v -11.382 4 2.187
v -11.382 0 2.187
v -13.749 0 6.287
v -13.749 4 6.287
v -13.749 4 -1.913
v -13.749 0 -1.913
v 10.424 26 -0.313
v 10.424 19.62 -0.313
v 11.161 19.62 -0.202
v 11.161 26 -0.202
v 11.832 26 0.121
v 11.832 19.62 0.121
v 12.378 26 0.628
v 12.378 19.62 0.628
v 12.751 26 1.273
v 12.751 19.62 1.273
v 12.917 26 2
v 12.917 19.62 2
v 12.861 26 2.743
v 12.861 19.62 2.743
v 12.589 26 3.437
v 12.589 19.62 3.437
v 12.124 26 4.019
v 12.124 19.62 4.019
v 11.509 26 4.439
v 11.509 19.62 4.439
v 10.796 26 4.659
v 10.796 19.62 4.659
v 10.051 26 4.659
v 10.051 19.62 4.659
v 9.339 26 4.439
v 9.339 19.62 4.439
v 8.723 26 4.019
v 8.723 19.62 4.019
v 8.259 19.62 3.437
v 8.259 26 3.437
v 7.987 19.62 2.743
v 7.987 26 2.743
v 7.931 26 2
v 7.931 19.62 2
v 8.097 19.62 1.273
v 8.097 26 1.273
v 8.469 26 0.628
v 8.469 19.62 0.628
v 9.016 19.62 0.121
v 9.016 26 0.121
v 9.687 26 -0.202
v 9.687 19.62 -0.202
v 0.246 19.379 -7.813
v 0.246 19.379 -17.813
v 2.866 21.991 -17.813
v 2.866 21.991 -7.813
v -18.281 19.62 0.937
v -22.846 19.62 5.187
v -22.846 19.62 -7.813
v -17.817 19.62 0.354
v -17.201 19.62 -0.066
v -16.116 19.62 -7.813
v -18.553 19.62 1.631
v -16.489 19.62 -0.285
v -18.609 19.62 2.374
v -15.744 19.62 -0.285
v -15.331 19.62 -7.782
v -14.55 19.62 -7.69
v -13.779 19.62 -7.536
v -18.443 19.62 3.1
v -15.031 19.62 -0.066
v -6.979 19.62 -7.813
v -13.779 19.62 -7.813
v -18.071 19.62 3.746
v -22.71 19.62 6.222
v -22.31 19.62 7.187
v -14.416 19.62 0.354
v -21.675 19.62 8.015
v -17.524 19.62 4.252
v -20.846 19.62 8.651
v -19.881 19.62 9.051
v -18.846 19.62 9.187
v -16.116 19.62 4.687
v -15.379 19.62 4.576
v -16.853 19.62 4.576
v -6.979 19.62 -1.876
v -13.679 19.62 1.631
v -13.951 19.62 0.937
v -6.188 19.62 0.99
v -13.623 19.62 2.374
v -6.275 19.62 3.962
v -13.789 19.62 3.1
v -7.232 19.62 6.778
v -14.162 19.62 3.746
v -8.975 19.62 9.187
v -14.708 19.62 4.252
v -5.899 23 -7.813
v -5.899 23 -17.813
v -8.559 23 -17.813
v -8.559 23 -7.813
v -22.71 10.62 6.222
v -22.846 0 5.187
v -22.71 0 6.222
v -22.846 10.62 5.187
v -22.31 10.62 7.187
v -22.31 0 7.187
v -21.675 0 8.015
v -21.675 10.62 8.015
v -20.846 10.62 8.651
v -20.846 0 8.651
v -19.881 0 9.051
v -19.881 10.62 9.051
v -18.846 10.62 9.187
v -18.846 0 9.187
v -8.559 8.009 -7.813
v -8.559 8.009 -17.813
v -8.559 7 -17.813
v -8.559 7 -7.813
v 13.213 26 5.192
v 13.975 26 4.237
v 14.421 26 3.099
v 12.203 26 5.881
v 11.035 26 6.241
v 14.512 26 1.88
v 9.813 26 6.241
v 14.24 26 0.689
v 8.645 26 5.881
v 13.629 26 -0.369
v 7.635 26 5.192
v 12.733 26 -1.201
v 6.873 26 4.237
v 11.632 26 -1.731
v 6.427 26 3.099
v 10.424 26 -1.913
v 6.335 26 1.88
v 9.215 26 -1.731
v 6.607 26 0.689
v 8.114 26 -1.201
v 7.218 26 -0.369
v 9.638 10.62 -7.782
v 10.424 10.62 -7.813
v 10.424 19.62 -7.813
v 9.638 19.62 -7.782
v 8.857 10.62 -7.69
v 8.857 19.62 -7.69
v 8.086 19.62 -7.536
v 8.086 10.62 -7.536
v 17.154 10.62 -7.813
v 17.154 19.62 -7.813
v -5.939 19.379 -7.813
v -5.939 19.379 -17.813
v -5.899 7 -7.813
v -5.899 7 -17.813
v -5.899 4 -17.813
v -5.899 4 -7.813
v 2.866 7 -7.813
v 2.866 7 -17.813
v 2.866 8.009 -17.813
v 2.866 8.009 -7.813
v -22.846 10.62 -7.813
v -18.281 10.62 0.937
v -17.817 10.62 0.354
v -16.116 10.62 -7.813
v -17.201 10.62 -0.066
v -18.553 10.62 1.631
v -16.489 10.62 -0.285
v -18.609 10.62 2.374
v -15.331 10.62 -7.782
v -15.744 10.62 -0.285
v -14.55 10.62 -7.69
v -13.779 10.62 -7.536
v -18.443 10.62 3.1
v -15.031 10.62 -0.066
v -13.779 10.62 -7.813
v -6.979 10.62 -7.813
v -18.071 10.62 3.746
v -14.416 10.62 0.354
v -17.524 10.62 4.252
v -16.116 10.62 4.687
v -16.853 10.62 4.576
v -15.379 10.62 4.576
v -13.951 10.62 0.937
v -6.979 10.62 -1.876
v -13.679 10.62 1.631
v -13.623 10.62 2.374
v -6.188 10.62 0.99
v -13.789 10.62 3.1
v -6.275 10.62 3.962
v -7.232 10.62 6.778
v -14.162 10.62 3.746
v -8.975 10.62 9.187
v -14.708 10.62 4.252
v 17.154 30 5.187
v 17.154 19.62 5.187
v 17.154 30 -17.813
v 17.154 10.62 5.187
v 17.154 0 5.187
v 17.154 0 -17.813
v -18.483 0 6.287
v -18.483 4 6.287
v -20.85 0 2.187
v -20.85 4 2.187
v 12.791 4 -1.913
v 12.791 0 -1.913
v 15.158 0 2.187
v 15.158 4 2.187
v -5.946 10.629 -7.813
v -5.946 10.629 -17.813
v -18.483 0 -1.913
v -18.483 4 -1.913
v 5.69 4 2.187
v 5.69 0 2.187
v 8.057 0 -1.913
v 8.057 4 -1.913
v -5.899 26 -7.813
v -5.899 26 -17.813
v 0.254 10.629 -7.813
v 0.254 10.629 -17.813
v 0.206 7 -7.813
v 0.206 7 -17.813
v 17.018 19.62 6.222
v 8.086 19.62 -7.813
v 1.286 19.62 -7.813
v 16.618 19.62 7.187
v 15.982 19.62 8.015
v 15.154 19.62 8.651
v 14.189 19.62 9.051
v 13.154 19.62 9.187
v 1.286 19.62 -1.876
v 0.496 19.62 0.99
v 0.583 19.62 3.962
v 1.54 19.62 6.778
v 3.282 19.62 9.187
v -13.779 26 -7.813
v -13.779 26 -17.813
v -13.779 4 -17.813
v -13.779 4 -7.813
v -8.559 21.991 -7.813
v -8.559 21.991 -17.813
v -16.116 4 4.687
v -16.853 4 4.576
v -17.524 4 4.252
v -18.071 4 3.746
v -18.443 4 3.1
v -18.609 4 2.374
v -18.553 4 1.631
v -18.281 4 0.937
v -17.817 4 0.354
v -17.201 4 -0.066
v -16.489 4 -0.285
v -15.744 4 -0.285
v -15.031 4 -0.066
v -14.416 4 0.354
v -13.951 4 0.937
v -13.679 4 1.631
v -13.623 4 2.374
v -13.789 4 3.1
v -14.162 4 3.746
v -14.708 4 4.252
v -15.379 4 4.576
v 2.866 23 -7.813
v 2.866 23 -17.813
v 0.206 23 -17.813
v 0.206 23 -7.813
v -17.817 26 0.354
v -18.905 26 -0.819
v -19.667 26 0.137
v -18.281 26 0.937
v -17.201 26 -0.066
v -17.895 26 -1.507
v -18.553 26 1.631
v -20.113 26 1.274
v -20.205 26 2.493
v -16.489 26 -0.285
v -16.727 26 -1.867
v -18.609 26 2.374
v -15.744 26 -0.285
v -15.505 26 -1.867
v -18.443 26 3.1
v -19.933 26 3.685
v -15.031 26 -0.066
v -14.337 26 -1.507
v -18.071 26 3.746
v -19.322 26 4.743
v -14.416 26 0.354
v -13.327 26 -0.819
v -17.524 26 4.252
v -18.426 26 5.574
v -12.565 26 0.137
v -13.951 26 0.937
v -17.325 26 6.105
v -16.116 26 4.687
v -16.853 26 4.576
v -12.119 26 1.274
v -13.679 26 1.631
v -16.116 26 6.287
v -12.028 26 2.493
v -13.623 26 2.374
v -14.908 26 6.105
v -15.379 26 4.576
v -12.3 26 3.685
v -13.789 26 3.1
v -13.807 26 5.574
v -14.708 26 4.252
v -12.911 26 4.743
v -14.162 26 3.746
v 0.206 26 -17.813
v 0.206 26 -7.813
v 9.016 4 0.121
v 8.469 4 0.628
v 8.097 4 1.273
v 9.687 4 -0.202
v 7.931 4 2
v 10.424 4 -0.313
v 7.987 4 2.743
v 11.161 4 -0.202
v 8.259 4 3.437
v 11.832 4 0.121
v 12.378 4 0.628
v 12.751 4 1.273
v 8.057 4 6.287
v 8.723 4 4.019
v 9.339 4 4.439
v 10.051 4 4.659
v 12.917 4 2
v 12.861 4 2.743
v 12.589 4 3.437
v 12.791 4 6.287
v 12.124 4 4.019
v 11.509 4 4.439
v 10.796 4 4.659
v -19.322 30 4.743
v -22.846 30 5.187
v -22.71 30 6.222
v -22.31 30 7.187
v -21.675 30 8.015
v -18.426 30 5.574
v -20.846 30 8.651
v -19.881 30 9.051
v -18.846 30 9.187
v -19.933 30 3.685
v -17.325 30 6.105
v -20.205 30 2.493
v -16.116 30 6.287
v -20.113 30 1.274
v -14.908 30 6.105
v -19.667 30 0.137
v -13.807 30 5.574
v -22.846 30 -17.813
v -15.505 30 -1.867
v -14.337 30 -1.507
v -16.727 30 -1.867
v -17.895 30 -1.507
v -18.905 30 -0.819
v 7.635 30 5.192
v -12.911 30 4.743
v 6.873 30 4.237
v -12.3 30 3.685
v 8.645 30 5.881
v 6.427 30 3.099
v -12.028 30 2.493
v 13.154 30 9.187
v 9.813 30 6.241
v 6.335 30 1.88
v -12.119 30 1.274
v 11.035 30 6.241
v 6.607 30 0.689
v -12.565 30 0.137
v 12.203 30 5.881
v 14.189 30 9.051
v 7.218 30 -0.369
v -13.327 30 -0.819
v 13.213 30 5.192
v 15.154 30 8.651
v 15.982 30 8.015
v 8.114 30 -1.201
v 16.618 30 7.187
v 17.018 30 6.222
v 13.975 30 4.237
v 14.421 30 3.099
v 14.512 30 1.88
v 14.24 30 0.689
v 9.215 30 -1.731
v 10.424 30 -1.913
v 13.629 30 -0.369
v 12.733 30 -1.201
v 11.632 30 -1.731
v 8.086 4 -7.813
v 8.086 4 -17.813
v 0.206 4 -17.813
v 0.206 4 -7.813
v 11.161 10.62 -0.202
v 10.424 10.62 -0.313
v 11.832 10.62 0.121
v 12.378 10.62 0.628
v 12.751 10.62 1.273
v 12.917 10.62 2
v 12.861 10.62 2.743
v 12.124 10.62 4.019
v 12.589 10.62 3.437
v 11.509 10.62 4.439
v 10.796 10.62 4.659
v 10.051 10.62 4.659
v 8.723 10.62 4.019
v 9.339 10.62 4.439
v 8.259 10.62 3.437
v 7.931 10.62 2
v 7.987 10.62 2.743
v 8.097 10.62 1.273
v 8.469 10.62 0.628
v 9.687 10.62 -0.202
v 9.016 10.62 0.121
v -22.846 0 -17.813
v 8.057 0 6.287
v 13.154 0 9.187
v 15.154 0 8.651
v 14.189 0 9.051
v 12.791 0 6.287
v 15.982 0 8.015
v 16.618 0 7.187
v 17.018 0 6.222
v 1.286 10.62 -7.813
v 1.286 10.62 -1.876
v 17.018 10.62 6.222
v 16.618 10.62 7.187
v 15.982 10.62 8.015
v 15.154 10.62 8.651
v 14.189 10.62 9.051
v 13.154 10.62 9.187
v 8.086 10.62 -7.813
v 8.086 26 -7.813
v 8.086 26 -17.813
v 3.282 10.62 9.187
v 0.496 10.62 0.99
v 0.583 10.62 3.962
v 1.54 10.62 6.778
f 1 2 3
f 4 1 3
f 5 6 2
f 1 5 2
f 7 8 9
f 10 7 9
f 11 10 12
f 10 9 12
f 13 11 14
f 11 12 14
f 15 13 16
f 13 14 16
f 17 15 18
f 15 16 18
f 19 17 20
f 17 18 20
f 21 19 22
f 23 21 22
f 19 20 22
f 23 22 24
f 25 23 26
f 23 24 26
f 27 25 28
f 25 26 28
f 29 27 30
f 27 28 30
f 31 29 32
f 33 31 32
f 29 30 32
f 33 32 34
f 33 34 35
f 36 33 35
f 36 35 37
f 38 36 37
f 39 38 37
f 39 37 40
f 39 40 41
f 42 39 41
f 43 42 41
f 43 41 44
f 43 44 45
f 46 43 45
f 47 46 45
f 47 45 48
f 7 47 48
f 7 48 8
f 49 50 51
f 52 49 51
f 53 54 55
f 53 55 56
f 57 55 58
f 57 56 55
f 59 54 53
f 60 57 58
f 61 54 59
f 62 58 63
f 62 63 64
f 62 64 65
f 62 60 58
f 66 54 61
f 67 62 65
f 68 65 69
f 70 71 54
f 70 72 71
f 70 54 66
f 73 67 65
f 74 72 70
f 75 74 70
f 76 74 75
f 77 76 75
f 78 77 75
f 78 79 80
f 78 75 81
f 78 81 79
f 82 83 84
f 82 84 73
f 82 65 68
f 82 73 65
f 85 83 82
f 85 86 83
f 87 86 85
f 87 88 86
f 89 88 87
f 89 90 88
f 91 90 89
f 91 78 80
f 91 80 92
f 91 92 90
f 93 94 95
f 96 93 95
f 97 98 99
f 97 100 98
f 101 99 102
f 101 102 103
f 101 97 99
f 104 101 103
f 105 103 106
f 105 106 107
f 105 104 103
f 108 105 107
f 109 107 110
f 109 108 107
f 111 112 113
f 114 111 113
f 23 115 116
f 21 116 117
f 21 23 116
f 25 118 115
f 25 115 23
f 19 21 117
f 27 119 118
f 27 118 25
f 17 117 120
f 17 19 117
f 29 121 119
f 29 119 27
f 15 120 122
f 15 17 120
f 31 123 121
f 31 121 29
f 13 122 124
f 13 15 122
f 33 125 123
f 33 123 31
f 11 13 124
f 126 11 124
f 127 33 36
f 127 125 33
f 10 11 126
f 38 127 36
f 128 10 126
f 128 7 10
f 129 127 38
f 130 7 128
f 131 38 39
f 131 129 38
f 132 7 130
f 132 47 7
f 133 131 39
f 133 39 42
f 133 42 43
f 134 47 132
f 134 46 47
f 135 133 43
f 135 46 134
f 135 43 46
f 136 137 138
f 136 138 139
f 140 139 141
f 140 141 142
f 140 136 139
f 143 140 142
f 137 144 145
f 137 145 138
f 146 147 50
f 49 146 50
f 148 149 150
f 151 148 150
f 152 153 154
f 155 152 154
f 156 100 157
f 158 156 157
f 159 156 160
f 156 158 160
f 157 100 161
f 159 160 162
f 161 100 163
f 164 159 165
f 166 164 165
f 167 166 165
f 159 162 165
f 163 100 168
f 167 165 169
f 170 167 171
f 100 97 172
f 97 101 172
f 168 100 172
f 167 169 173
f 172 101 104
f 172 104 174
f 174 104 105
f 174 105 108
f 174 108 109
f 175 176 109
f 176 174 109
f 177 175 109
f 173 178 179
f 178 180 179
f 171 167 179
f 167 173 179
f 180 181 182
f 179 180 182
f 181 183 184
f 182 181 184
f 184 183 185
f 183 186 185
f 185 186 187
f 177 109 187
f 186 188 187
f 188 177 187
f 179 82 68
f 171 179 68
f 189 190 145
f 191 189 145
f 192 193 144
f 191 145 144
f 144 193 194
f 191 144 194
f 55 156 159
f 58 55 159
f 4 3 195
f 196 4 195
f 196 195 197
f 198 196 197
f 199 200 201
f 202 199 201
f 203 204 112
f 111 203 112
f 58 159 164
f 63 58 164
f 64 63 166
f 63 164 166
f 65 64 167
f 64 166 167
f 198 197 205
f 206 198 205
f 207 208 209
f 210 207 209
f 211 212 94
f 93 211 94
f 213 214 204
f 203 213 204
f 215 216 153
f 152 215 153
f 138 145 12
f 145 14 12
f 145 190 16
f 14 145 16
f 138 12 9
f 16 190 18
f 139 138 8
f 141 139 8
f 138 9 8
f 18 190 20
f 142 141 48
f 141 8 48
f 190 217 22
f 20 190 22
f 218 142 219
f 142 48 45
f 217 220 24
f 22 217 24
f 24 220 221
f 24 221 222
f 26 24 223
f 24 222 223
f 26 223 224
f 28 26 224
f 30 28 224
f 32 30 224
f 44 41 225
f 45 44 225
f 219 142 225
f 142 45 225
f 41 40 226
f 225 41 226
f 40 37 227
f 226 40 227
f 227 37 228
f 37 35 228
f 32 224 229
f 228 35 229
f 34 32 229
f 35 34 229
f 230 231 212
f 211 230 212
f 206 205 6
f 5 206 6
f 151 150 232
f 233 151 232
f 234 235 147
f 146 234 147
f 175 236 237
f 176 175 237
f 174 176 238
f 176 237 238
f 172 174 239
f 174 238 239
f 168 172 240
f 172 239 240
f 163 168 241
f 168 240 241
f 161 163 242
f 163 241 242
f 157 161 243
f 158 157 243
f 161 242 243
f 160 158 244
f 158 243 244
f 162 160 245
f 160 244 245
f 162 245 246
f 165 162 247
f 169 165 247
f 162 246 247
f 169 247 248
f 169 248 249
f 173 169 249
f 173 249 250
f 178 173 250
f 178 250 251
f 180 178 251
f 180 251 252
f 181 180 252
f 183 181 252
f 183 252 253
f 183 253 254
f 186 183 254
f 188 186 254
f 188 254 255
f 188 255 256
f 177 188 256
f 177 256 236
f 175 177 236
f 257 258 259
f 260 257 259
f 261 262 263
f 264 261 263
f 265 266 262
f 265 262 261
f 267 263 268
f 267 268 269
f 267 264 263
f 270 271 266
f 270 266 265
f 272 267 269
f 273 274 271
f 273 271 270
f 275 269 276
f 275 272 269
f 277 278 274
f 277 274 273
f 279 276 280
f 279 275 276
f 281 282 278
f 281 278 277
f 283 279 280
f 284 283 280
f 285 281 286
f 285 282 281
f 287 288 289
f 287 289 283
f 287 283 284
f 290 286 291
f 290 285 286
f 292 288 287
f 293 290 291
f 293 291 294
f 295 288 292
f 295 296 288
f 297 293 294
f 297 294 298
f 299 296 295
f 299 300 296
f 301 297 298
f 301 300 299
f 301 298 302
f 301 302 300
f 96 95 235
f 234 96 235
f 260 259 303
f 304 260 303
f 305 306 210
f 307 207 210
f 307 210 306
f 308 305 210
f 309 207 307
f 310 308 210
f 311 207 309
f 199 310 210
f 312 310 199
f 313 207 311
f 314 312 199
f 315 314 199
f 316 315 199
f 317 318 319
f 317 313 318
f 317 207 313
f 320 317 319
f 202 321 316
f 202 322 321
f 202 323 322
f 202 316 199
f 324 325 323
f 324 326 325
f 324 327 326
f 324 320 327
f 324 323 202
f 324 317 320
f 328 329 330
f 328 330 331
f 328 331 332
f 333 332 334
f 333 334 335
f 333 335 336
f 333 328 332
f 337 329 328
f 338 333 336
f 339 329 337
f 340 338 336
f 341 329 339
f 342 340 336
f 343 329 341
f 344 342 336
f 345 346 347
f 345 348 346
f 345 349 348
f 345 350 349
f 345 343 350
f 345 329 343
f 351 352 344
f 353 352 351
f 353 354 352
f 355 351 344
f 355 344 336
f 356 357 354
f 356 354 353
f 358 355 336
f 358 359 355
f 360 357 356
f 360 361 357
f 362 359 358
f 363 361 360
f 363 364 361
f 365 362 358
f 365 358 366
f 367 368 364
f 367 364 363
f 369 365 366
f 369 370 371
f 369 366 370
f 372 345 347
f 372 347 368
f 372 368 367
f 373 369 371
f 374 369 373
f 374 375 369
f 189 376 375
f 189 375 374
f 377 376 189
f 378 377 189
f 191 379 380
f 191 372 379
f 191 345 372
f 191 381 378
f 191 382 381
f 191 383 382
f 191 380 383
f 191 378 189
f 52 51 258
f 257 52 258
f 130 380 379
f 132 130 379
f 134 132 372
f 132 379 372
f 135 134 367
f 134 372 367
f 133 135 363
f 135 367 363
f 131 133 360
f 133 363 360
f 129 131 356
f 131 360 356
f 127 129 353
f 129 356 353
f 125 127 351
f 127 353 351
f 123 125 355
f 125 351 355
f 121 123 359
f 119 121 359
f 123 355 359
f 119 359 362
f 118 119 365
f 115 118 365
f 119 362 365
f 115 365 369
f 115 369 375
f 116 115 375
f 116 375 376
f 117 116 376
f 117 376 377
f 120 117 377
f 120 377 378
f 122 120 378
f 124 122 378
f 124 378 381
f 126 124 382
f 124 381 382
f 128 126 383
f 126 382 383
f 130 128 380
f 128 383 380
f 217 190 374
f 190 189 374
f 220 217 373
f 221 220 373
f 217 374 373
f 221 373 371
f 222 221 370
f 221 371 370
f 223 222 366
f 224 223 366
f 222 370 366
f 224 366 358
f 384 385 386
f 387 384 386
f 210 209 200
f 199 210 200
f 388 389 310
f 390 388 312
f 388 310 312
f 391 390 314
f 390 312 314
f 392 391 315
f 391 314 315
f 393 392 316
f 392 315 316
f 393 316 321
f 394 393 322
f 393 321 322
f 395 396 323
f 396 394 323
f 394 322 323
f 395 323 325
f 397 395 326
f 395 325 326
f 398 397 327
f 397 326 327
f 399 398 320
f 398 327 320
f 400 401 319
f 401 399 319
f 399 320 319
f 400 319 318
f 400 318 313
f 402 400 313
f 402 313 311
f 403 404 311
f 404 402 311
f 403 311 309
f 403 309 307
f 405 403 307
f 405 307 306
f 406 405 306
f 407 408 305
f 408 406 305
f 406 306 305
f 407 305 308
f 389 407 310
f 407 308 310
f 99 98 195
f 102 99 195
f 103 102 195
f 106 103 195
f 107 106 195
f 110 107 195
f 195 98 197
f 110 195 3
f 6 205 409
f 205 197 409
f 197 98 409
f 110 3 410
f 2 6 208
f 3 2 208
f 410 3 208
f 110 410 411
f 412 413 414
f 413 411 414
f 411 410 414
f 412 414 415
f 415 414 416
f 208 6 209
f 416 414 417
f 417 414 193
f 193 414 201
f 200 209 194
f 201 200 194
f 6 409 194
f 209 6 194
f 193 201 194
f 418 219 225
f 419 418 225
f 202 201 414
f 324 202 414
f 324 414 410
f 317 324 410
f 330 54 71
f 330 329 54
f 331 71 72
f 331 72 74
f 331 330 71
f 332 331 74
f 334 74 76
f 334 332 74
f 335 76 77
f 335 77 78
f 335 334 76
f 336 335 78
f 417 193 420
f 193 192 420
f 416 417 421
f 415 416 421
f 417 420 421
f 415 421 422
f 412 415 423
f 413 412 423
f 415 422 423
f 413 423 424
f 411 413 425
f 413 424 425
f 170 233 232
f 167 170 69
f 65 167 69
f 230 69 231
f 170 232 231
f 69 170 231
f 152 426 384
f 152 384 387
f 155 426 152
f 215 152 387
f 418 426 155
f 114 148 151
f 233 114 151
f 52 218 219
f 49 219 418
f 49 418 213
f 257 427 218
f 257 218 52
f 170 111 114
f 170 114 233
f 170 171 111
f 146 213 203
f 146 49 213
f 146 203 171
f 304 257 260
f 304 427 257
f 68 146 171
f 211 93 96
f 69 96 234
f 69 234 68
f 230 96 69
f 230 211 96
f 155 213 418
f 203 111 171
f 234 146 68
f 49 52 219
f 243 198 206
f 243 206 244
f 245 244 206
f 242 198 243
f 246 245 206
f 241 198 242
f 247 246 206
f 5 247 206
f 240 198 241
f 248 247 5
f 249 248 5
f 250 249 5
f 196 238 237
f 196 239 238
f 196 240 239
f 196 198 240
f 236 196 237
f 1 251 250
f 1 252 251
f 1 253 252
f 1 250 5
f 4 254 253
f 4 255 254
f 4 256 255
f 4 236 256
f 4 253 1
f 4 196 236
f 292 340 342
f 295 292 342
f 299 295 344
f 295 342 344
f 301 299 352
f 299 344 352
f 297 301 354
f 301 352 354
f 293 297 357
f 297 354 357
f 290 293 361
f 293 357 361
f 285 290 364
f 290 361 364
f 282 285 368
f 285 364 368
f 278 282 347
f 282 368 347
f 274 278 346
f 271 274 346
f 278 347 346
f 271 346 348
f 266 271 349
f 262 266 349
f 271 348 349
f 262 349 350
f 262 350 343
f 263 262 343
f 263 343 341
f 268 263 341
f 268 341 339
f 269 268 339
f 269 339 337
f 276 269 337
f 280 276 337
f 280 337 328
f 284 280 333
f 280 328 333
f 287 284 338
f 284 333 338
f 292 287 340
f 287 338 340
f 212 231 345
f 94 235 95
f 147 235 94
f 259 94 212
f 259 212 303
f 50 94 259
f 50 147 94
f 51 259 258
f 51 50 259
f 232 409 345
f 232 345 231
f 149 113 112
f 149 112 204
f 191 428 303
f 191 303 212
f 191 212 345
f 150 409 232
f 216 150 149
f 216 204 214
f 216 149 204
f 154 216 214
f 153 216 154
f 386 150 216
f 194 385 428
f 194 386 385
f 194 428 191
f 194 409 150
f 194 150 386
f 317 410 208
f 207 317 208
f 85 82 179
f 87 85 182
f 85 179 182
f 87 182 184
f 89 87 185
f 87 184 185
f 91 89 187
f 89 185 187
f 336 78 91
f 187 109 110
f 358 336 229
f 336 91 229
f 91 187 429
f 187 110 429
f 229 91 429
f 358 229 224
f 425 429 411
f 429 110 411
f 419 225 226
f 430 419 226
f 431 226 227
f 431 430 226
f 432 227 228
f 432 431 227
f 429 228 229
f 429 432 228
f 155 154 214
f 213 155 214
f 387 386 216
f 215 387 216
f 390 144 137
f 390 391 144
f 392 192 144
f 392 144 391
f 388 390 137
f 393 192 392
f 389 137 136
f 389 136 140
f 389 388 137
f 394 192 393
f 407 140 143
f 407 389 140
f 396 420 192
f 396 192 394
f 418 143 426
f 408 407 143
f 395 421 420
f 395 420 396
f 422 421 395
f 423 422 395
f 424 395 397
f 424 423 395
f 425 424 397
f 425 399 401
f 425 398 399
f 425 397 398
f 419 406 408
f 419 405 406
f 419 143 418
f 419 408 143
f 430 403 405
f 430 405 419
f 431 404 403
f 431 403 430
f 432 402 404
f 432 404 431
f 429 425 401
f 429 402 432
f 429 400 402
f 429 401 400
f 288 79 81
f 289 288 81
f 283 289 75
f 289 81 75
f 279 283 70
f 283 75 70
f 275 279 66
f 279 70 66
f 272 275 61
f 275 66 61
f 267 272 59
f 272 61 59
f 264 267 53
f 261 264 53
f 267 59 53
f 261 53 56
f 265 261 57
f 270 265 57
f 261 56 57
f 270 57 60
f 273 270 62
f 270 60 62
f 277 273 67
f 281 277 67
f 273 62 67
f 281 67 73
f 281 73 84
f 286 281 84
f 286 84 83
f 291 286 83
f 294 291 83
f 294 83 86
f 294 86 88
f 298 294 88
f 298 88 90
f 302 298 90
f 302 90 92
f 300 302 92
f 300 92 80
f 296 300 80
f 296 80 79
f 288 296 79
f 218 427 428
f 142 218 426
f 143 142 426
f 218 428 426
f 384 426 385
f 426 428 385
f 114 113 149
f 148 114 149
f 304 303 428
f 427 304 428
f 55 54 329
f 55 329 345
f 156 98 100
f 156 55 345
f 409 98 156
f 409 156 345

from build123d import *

# Parameters (mm, degrees)
SKETCH1_W           = 40
SKETCH1_H           = 27
BOSS_EXTRUDE1_DEPTH = 30
CUT_EXTRUDE1_DEPTH  = 10
SKETCH3_R           = 2.5
CUT_EXTRUDE2_DEPTH  = 30
CUT_EXTRUDE5_START  = -10.62
CUT_EXTRUDE5_DEPTH  = 9
SKETCH10_W          = 20
SKETCH10_H          = 9
CUT_EXTRUDE7_DEPTH  = 6.8
SKETCH12_W          = 20
SKETCH12_H          = 9
CUT_EXTRUDE10_DEPTH = 6.8
FILLET1_R           = 4
SKETCH15_R          = 4.1
CUT_EXTRUDE12_DEPTH = 4
SKETCH16_R          = 2.5
CUT_EXTRUDE13_DEPTH = 4


with BuildPart() as part:
    # Sketch1 → Boss-Extrude1 (new body)
    with BuildSketch(Plane(origin=(0, 0, 0), x_dir=(1, 0, 0), z_dir=(0, 1, 0))):
        with Locations((-2.846153846, 4.313186813)):
            Rectangle(SKETCH1_W, SKETCH1_H)
    extrude(amount=BOSS_EXTRUDE1_DEPTH)

    # Sketch2 → Cut-Extrude1 (cut)
    with BuildSketch(Plane(origin=(0, 0, -17.813186813), x_dir=(-1, 0, 0), z_dir=(0, 0, -1))):
        Polygon((-8.086431081, 26), (-8.086431081, 4), (-0.206431081, 4), (-0.206431081, 7), (-2.866431081, 7), (-2.866431081, 8.008707537), (-0.253846154, 10.628707537), (5.946153846, 10.628707537), (8.558738773, 8.008707537), (8.558738773, 7), (5.898738773, 7), (5.898738773, 4), (13.778738773, 4), (13.778738773, 26), (5.898738773, 26), (5.898738773, 23), (8.558738773, 23), (8.558738773, 21.991292463), (5.938738773, 19.378707537), (-0.246431081, 19.378707537), (-2.866431081, 21.991292463), (-2.866431081, 23), (-0.206431081, 23), (-0.206431081, 26), align=None)
    extrude(amount=-CUT_EXTRUDE1_DEPTH, mode=Mode.SUBTRACT)

    # Sketch3 → Cut-Extrude2 (cut)
    with BuildSketch(Plane.XZ):
        with Locations((10.423846154, 2.186813187)):
            Circle(SKETCH3_R)
        with Locations((-16.116153846, 2.186813187)):
            Circle(SKETCH3_R)
    extrude(amount=-CUT_EXTRUDE2_DEPTH, mode=Mode.SUBTRACT)

    # Sketch8 → Cut-Extrude5 (cut)
    with BuildSketch(Plane.XZ.offset(CUT_EXTRUDE5_START)):
        with BuildLine():
            Line((17.153846154, 9.186813187), (3.282417725, 9.186813187))
            ThreePointArc((3.282417725, 9.186813187), (1.204301697, -1.686170159), (10.423846154, -7.813186813))
            Line((10.423846154, -7.813186813), (17.153846154, -7.813186813))
            Line((17.153846154, -7.813186813), (17.153846154, 9.186813187))
        make_face()
        with BuildLine():
            ThreePointArc((-16.116153846, -7.813186813), (-6.896609389, -1.686170159), (-8.974725418, 9.186813187))
            Line((-8.974725418, 9.186813187), (-22.846153846, 9.186813187))
            Line((-22.846153846, 9.186813187), (-22.846153846, -7.813186813))
            Line((-22.846153846, -7.813186813), (-16.116153846, -7.813186813))
        make_face()
    extrude(amount=-CUT_EXTRUDE5_DEPTH, mode=Mode.SUBTRACT)

    # Sketch10 → Cut-Extrude7 (cut)
    with BuildSketch(Plane.ZY.offset(-8.086431081)):
        with Locations((-7.813186813, 15.12)):
            Rectangle(SKETCH10_W, SKETCH10_H)
    extrude(amount=CUT_EXTRUDE7_DEPTH, mode=Mode.SUBTRACT)

    # Sketch12 → Cut-Extrude10 (cut)
    with BuildSketch(Plane(origin=(-13.778738773, 0, 0), x_dir=(0, 0, -1), z_dir=(1, 0, 0))):
        with Locations((7.813186813, 15.12)):
            Rectangle(SKETCH12_W, SKETCH12_H)
    extrude(amount=CUT_EXTRUDE10_DEPTH, mode=Mode.SUBTRACT)

    # Fillet1
    fillet1_edges = [part.edges().sort_by_distance(p)[0] for p in [
        (17.153846154, 5.31, 9.186813187),
        (17.153846154, 24.81, 9.186813187),
        (-22.846153846, 5.31, 9.186813187),
        (-22.846153846, 24.81, 9.186813187),
    ]]
    fillet(fillet1_edges, radius=FILLET1_R)

    # Sketch15 → Cut-Extrude12 (cut)
    with BuildSketch(Plane(origin=(0, 30, 0), x_dir=(1, 0, 0), z_dir=(0, 1, 0))):
        with Locations((-16.116153846, -2.186813187)):
            Circle(SKETCH15_R)
        with Locations((10.423846154, -2.186813187)):
            Circle(SKETCH15_R)
    extrude(amount=-CUT_EXTRUDE12_DEPTH, mode=Mode.SUBTRACT)

    # Sketch16 → Cut-Extrude13 (cut)
    # profile 1 of 2: a face of its own
    with BuildSketch(Plane.XZ):
        Polygon((-13.749017742, -1.913186813), (-11.381881639, 2.186813187), (-13.749017742, 6.286813187), (-18.48328995, 6.286813187), (-20.850426054, 2.186813187), (-18.48328995, -1.913186813), align=None)
        with Locations((-16.116153846, 2.186813187)):
            Circle(SKETCH16_R, mode=Mode.SUBTRACT)
    # profile 2 of 2: a face of its own
    with BuildSketch(Plane.XZ):
        Polygon((12.790982258, -1.913186813), (15.158118361, 2.186813187), (12.790982258, 6.286813187), (8.05671005, 6.286813187), (5.689573946, 2.186813187), (8.05671005, -1.913186813), align=None)
        with Locations((10.423846154, 2.186813187)):
            Circle(SKETCH16_R, mode=Mode.SUBTRACT)
    extrude(amount=-CUT_EXTRUDE13_DEPTH, mode=Mode.SUBTRACT)


solid = part.part
